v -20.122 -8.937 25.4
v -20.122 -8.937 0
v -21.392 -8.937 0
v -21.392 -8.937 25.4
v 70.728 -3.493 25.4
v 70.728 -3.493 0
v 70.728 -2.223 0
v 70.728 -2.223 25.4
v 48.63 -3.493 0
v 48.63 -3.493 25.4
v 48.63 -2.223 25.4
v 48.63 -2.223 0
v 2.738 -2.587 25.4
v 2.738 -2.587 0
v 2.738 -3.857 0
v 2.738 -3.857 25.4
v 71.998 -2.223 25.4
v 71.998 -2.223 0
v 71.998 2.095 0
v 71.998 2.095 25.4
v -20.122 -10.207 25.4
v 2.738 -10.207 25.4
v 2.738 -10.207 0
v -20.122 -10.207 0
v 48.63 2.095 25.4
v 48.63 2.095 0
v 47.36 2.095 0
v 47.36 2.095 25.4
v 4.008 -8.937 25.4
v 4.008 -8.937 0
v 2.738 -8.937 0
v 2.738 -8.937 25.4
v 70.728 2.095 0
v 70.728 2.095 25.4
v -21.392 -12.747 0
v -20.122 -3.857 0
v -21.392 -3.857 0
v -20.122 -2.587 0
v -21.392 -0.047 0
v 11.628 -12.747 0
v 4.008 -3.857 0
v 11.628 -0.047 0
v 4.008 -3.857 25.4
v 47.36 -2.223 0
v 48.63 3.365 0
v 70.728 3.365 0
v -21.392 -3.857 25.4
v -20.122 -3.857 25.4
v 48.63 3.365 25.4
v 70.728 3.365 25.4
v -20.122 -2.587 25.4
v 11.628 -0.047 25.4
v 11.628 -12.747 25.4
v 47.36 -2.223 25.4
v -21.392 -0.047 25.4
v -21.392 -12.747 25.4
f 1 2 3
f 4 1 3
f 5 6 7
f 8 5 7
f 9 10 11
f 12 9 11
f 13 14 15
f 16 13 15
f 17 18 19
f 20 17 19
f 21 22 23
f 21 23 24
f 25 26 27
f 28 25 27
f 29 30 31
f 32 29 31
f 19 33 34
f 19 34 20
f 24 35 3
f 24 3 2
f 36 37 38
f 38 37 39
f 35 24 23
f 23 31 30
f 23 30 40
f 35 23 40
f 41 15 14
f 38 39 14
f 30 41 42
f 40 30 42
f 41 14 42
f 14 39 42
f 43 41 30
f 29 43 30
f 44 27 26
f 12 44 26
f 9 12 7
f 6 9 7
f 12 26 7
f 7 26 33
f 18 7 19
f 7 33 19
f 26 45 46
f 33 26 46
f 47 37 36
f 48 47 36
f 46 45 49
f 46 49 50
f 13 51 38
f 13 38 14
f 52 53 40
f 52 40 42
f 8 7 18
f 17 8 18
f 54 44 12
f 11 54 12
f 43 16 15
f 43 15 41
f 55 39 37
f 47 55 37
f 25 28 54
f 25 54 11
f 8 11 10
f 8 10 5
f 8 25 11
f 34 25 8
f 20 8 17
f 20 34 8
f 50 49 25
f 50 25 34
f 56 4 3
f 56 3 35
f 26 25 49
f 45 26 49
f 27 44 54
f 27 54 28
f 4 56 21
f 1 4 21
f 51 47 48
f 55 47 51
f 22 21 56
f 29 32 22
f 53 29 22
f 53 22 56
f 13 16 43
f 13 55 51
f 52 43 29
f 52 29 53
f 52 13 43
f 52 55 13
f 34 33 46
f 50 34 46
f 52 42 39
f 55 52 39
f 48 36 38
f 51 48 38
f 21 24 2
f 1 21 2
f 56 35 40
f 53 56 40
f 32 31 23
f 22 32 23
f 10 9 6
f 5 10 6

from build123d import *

# Parameters (mm, degrees)
F1_DEPTH = 25.4
F0_W     = 22.098
F0_H     = 4.318
F0_W_2   = 1.27
F0_H_2   = 1.27


# Not quite as in the source:
# - a feature names something its author has since deleted; it is built from what else it names


with BuildPart() as f1:
    # F0 (on Top) → F1 (new body)
    with BuildSketch(Plane.XY):
        Polygon((-20.1215016502, -3.8572545798), (-20.1215016502, -2.5872545798), (2.7384983498, -2.5872545798), (2.7384983498, -3.8572545798), (4.0084983498, -3.8572545798), (4.0084983498, -8.9372545798), (2.7384983498, -8.9372545798), (2.7384983498, -10.2072545798), (-20.1215016502, -10.2072545798), (-20.1215016502, -8.9372545798), (-21.3915016502, -8.9372545798), (-21.3915016502, -12.7472545798), (11.6284983498, -12.7472545798), (11.6284983498, -0.0472545798), (-21.3915016502, -0.0472545798), (-21.3915016502, -3.8572545798), align=None)
    extrude(amount=F1_DEPTH)


with BuildPart() as f1b:
    # F0 (on Top) → F1, piece 2 (new body)
    with BuildSketch(Plane.XY):
        with Locations((59.6792152276, -0.0636551082)):
            Rectangle(F0_W, F0_H)
        with Locations((47.9952152276, -0.0636551082)):
            Rectangle(F0_W_2, F0_H)
        with Locations((59.6792152276, -2.8576551082)):
            Rectangle(F0_W, F0_H_2)
        with Locations((59.6792152276, 2.7303448918)):
            Rectangle(F0_W, F0_H_2)
        with Locations((71.3632152276, -0.0636551082)):
            Rectangle(F0_W_2, F0_H)
    extrude(amount=F1_DEPTH)


solid = Compound([f1.part, f1b.part])
